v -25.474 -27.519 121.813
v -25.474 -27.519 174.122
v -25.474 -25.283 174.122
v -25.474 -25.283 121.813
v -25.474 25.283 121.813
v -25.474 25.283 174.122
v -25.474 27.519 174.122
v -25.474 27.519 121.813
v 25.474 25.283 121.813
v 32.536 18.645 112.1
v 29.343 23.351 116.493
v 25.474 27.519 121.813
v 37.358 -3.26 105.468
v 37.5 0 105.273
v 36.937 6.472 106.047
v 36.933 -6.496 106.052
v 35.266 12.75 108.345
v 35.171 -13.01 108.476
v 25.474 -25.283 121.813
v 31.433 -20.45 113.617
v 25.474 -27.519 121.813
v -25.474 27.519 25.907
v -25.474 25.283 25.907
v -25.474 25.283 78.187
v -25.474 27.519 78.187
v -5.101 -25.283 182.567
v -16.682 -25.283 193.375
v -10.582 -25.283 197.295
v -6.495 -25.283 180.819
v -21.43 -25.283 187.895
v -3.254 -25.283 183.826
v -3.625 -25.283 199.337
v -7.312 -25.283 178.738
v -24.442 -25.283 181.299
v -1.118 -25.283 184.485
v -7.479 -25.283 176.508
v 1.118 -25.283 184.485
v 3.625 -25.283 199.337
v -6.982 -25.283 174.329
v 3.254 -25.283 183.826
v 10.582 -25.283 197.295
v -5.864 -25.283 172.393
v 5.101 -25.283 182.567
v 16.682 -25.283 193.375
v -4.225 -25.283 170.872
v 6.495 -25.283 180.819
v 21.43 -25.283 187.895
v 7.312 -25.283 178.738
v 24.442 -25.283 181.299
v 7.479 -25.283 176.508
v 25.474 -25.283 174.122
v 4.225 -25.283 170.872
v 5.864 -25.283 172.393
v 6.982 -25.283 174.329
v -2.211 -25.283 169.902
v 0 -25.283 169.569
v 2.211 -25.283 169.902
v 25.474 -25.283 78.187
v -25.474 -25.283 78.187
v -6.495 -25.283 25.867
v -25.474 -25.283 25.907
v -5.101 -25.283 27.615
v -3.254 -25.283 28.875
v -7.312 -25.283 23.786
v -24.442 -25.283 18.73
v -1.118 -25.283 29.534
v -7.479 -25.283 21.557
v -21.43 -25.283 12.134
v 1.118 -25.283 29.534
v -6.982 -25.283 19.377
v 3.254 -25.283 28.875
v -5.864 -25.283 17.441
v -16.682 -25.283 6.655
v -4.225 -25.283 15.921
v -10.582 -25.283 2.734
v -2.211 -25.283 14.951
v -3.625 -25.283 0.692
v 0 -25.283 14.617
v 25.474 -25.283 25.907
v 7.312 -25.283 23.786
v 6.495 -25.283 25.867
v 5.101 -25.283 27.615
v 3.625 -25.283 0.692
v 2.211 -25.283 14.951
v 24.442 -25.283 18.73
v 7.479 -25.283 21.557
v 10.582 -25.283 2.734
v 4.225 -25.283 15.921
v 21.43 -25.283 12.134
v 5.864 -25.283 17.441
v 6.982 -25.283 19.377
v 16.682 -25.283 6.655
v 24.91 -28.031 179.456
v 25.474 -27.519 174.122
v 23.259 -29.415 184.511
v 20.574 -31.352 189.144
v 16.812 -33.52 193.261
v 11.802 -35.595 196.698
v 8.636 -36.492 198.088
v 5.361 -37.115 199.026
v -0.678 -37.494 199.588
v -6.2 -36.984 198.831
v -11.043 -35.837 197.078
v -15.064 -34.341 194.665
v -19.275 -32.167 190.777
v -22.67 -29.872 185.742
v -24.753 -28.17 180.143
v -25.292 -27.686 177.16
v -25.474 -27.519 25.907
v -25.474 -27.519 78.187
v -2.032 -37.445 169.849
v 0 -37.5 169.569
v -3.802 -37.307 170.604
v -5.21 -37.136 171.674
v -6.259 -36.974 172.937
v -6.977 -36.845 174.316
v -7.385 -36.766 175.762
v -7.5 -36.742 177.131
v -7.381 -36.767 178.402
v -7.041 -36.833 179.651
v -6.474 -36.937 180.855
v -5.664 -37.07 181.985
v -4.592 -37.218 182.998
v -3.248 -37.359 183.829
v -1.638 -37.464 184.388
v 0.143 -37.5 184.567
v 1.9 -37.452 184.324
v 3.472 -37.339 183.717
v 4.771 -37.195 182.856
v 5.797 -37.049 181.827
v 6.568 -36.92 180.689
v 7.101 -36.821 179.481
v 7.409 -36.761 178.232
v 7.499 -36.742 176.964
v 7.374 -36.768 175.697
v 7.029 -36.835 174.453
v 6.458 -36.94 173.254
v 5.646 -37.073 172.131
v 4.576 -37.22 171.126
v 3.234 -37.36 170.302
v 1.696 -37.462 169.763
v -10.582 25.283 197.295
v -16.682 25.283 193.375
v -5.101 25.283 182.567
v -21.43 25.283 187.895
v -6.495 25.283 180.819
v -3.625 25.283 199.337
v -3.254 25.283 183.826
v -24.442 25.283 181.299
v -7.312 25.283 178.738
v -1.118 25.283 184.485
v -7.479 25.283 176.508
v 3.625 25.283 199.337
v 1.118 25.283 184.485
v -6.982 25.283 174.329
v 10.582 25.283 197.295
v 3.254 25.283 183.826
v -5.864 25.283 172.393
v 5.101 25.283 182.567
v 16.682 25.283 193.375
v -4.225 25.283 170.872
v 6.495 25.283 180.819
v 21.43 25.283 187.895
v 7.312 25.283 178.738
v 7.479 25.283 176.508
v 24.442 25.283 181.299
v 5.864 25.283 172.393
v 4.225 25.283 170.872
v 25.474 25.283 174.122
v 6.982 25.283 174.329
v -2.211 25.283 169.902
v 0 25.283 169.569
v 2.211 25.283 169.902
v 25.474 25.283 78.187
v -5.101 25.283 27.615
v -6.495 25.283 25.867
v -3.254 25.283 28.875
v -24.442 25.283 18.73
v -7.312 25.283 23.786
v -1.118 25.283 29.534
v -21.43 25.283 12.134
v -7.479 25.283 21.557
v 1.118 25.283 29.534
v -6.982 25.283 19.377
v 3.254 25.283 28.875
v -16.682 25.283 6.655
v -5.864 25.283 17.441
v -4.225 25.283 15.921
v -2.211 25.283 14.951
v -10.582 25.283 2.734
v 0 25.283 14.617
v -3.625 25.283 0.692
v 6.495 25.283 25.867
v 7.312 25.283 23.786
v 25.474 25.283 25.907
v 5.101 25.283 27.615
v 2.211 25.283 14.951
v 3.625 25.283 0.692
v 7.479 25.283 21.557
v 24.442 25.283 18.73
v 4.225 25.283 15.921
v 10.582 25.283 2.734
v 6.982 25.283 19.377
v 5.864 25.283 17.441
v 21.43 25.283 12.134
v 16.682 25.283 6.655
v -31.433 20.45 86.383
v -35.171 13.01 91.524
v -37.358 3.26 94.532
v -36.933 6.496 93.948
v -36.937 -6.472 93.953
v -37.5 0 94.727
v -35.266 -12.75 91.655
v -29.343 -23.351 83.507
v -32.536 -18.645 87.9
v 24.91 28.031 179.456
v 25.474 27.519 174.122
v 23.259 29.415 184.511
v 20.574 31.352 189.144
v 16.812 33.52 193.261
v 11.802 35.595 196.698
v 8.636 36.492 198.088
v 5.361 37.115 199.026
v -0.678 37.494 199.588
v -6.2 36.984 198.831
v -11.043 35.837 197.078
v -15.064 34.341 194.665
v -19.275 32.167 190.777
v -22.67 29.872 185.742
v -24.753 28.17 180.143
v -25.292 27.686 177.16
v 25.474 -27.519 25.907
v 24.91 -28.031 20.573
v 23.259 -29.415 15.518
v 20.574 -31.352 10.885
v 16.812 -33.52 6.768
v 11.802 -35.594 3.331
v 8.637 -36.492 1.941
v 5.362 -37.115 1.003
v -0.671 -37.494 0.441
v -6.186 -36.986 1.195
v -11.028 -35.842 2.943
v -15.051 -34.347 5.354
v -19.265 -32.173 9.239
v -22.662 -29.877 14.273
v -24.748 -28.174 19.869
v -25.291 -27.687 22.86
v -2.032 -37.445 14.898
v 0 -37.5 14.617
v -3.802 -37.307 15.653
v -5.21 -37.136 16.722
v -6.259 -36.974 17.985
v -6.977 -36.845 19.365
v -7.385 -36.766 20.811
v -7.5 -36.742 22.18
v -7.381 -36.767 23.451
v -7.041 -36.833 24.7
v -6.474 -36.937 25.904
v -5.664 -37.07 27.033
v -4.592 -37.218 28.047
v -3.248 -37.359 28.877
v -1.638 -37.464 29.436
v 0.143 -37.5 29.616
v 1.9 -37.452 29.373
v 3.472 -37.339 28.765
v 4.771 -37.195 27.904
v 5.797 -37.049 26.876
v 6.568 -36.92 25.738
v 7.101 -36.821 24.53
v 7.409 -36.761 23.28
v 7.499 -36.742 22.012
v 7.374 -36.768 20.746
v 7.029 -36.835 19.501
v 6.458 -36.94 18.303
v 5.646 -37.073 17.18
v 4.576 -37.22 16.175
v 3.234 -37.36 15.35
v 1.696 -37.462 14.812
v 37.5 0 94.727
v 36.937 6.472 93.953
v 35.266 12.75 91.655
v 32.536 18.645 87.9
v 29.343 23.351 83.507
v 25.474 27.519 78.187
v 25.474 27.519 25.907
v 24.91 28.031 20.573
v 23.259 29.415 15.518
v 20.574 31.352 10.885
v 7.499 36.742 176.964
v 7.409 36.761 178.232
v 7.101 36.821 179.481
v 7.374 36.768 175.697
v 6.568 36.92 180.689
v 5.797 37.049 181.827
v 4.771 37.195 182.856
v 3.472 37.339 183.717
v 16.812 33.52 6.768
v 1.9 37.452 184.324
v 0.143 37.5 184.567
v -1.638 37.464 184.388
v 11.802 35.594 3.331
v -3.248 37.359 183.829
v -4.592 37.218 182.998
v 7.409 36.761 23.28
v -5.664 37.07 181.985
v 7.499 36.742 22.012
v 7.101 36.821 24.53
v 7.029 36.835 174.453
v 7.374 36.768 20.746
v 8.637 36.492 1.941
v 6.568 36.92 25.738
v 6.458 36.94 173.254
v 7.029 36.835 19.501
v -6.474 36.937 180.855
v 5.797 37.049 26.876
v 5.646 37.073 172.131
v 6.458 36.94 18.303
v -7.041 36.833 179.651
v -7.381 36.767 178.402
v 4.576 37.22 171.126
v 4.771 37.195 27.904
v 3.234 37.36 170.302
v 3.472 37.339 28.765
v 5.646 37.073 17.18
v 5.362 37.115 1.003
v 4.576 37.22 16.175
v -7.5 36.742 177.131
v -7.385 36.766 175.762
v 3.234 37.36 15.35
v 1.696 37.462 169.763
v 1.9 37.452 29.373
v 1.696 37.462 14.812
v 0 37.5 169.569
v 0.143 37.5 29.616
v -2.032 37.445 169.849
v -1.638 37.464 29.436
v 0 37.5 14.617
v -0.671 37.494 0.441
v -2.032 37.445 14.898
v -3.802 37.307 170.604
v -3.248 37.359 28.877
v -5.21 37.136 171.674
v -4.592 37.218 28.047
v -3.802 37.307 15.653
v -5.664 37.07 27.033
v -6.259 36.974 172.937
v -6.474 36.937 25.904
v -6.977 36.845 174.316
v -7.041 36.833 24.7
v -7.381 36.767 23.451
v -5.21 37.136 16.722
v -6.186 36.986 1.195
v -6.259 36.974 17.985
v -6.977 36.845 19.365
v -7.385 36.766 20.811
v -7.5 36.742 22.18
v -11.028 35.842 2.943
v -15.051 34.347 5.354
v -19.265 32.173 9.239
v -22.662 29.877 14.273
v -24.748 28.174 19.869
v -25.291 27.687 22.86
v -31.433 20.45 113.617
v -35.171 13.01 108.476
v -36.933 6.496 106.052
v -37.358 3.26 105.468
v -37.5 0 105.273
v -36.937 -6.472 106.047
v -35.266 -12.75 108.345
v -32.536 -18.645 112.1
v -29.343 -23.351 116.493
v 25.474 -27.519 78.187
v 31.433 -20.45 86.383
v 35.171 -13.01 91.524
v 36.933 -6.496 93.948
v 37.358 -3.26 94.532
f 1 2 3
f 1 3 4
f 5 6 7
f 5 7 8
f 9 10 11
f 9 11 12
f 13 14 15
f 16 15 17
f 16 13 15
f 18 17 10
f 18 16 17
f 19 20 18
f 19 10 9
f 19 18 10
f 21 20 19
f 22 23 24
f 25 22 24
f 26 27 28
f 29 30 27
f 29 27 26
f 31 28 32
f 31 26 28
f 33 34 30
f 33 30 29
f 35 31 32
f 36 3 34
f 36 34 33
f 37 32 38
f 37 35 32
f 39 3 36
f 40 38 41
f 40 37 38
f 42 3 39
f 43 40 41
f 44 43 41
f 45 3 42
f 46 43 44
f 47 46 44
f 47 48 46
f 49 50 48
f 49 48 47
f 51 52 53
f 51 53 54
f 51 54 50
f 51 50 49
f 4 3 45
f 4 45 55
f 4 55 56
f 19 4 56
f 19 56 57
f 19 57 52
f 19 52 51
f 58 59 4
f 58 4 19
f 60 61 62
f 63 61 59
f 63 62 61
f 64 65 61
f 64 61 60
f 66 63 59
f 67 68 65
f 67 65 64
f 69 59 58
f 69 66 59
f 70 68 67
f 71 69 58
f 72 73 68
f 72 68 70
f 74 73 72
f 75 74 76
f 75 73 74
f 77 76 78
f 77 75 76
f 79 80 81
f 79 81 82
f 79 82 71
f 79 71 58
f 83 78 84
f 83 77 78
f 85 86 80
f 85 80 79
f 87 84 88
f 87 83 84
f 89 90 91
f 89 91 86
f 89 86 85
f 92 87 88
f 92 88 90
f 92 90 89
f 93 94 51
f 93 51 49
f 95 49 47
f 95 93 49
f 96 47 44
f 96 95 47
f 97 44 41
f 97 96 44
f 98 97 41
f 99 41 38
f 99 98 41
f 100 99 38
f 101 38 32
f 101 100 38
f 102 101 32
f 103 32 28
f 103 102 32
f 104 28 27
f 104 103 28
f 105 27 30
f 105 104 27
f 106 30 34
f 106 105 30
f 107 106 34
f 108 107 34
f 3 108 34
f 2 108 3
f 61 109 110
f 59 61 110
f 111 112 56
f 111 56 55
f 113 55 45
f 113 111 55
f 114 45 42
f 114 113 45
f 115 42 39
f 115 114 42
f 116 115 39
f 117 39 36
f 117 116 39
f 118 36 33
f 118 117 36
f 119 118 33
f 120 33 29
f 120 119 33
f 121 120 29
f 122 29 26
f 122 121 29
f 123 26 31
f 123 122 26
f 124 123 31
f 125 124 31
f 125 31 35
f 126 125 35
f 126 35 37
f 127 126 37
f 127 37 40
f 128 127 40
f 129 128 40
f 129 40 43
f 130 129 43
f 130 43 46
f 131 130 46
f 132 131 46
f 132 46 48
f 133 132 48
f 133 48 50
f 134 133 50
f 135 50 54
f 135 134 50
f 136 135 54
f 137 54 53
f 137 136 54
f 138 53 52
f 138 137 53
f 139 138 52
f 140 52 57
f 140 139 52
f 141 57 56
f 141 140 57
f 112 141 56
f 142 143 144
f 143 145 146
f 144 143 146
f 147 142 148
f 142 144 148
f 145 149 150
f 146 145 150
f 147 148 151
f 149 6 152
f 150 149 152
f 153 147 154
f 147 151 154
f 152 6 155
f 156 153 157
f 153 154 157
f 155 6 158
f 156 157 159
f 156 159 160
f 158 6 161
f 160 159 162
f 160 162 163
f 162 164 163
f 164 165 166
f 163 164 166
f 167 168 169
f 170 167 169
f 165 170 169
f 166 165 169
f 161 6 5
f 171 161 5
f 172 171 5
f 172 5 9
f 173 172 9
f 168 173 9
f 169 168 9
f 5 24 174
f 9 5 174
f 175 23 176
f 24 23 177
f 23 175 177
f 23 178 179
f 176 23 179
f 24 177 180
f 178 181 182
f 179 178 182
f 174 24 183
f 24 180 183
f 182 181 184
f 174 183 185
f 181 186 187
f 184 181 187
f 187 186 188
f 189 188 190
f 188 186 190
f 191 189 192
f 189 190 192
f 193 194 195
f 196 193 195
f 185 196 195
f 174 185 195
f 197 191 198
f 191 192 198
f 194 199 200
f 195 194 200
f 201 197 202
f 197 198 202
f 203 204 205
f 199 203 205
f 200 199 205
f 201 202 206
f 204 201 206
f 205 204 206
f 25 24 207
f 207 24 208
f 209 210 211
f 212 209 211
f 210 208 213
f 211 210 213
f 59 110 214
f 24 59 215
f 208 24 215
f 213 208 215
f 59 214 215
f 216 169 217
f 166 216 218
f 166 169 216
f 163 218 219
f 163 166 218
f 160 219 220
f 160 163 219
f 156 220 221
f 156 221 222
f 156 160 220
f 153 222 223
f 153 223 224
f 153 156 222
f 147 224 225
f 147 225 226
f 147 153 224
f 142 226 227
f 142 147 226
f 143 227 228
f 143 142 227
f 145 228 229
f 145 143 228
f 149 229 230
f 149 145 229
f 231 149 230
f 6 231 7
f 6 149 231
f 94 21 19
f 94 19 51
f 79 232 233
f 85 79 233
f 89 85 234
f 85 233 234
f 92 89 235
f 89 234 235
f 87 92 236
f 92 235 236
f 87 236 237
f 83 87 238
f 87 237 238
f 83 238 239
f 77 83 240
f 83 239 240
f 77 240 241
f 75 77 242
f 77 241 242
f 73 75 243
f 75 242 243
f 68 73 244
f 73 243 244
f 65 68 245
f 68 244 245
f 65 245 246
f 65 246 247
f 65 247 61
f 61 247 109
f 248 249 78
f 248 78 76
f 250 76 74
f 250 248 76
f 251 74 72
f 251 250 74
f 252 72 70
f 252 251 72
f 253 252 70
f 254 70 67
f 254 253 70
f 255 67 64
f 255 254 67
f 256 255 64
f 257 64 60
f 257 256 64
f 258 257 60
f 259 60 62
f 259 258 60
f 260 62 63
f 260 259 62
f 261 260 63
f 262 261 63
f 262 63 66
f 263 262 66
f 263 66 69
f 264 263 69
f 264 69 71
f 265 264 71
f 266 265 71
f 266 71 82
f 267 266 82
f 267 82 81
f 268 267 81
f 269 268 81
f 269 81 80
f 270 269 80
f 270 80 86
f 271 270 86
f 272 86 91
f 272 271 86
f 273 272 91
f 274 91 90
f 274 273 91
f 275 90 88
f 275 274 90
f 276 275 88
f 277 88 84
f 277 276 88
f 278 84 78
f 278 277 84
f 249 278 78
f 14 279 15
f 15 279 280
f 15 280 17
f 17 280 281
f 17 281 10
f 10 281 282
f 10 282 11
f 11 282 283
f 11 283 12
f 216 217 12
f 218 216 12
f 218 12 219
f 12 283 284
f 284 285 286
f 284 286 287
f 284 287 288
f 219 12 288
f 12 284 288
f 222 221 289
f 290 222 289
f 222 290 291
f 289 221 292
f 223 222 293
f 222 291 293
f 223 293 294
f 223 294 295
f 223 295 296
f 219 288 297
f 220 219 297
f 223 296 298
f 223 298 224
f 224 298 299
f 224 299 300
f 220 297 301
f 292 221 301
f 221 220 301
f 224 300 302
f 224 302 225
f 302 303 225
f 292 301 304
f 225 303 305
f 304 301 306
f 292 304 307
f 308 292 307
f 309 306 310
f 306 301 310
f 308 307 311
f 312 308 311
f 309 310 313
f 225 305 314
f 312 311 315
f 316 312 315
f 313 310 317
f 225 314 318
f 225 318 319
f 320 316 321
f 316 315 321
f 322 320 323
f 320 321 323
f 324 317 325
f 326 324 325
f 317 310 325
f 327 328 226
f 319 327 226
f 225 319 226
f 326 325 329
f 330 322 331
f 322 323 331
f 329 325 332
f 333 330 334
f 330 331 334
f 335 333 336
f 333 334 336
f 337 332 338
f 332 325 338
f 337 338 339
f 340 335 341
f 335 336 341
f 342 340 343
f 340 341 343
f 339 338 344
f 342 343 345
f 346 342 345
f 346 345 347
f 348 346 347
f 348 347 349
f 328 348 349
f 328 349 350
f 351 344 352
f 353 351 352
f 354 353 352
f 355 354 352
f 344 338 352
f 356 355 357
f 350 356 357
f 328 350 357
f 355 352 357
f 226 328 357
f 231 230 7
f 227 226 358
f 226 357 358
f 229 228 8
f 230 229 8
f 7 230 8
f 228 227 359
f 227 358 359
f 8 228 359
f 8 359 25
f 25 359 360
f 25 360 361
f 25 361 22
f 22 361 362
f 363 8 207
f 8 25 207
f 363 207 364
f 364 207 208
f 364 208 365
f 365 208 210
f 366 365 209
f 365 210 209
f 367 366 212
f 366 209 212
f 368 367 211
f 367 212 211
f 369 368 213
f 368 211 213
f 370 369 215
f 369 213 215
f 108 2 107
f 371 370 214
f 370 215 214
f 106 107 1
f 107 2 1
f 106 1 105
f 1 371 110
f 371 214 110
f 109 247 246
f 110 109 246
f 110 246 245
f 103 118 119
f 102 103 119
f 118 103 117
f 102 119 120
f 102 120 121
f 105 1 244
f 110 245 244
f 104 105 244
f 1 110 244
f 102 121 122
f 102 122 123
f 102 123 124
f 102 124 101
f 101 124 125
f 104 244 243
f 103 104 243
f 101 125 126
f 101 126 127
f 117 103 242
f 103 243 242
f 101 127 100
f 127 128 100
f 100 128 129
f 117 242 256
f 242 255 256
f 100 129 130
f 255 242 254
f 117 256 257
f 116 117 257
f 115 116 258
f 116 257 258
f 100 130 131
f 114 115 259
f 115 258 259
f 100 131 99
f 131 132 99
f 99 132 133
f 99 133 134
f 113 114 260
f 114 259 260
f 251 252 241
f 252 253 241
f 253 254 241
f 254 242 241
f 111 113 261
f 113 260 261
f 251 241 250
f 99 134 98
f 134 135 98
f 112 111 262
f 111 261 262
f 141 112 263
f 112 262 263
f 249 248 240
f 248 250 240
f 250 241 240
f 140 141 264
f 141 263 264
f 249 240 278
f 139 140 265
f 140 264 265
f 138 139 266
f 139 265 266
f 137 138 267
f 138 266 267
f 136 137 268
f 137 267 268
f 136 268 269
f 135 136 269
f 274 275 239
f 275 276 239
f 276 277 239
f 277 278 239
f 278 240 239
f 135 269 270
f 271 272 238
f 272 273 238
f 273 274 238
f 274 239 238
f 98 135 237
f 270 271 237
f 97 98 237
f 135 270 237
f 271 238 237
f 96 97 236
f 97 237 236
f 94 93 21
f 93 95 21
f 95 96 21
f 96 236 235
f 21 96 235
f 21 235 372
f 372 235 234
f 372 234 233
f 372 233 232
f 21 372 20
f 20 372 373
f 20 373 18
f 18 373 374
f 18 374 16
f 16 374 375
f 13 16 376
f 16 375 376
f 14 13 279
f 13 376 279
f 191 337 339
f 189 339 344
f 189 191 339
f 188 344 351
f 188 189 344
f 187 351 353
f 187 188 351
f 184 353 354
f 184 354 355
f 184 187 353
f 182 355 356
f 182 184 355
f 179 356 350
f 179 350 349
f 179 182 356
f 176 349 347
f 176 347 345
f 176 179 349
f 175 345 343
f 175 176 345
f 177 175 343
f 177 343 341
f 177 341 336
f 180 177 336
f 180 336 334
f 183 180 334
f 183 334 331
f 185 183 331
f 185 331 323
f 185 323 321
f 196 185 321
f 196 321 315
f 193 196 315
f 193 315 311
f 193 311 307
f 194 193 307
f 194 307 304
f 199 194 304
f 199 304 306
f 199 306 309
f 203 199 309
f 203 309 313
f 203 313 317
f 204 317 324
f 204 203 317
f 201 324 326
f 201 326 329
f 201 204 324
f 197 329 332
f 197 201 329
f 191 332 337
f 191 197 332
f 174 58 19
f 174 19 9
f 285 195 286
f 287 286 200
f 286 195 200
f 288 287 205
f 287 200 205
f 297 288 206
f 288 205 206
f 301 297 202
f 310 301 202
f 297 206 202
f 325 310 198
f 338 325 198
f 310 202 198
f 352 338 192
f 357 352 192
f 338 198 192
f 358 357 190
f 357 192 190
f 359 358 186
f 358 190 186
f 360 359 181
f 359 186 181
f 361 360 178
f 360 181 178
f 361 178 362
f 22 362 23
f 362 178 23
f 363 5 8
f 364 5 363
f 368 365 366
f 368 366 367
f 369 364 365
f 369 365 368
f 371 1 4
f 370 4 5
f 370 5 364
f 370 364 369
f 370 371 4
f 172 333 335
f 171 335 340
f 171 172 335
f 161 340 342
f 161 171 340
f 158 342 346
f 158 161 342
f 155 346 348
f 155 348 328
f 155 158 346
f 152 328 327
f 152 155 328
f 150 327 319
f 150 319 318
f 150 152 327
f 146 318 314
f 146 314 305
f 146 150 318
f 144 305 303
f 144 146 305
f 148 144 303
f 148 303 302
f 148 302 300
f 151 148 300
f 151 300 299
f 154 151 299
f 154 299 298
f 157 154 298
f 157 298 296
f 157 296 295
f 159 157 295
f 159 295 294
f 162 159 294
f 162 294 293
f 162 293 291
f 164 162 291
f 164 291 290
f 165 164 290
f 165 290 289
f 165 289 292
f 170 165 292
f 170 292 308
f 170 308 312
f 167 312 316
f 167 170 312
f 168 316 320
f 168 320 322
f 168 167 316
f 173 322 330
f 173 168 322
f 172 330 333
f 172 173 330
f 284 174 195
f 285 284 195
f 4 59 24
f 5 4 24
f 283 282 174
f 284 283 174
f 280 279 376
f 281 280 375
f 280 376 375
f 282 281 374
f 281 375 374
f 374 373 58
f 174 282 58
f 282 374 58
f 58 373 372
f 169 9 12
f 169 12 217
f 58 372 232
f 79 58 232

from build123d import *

# Parameters (mm, degrees)
SKETCH1_R               = 37.5
BOSS_EXTRUDE1_DEPTH     = 200
CUT_EXTRUDE1_DEPTH      = 80
CUT_EXTRUDE1_DEPTH_BACK = 99
SKETCH4_W               = 50.94838493
SKETCH4_H               = 50.56593793
CUT_EXTRUDE2_DEPTH      = 250
CUT_EXTRUDE3_DEPTH      = 250
CUT_EXTRUDE3_DEPTH_BACK = 250
SKETCH5_R               = 7.5


with BuildPart() as part:
    # Sketch1 → Boss-Extrude1 (new body)
    with BuildSketch(Plane.XY):
        Circle(SKETCH1_R)
    extrude(amount=BOSS_EXTRUDE1_DEPTH)

    # Sketch3 → Cut-Extrude1 (cut, two sides: drawn at the far end of the back side and taken through both)
    with BuildSketch(Plane(origin=(0, 0, 0), x_dir=(1, 0, 0), z_dir=(0, 1, 0)).offset(-CUT_EXTRUDE1_DEPTH_BACK)):
        with BuildLine():
            Line((-37.5, -200), (37.5, -200))
            Line((37.5, -200), (37.5, -105.272636972))
            Line((37.5, -105.272636972), (25.474192465, -121.813485854))
            Line((25.474192465, -121.813485854), (25.474192465, -174.122397941))
            ThreePointArc((25.474192465, -174.122397941), (0, -199.596590406), (-25.474192465, -174.122397941))
            Line((-25.474192465, -174.122397941), (-25.474192465, -121.813485854))
            Line((-25.474192465, -121.813485854), (-37.5, -105.272636972))
            Line((-37.5, -105.272636972), (-37.5, -200))
        make_face()
        with BuildLine():
            Line((-37.5, 0), (37.5, 0))
            Line((37.5, 0), (37.5, -94.727363028))
            Line((37.5, -94.727363028), (25.474192465, -78.186514146))
            Line((25.474192465, -78.186514146), (25.474192465, -25.906639532))
            ThreePointArc((25.474192465, -25.906639532), (0, -0.432447066), (-25.474192465, -25.906639532))
            Line((-25.474192465, -25.906639532), (-25.474192465, -78.186514146))
            Line((-25.474192465, -78.186514146), (-37.5, -94.727363028))
            Line((-37.5, -94.727363028), (-37.5, 0))
        make_face()
    extrude(amount=CUT_EXTRUDE1_DEPTH + CUT_EXTRUDE1_DEPTH_BACK, mode=Mode.SUBTRACT)

    # Sketch4 → Cut-Extrude2 (cut)
    with BuildSketch(Plane.XY):
        Rectangle(SKETCH4_W, SKETCH4_H)
    extrude(amount=CUT_EXTRUDE2_DEPTH, mode=Mode.SUBTRACT)

    # Sketch5 → Cut-Extrude3 (cut, two sides: drawn at the far end of the back side and taken through both)
    with BuildSketch(Plane(origin=(0, 0, 0), x_dir=(1, 0, 0), z_dir=(0, 1, 0)).offset(-CUT_EXTRUDE3_DEPTH_BACK)):
        with Locations(Location((0, -22.117350407, 0), (0, 0, 90))):
            Circle(SKETCH5_R)
        with Locations(Location((0, -177.068727344, 0), (0, 0, 90))):
            Circle(SKETCH5_R)
    extrude(amount=CUT_EXTRUDE3_DEPTH + CUT_EXTRUDE3_DEPTH_BACK, mode=Mode.SUBTRACT)


solid = part.part
